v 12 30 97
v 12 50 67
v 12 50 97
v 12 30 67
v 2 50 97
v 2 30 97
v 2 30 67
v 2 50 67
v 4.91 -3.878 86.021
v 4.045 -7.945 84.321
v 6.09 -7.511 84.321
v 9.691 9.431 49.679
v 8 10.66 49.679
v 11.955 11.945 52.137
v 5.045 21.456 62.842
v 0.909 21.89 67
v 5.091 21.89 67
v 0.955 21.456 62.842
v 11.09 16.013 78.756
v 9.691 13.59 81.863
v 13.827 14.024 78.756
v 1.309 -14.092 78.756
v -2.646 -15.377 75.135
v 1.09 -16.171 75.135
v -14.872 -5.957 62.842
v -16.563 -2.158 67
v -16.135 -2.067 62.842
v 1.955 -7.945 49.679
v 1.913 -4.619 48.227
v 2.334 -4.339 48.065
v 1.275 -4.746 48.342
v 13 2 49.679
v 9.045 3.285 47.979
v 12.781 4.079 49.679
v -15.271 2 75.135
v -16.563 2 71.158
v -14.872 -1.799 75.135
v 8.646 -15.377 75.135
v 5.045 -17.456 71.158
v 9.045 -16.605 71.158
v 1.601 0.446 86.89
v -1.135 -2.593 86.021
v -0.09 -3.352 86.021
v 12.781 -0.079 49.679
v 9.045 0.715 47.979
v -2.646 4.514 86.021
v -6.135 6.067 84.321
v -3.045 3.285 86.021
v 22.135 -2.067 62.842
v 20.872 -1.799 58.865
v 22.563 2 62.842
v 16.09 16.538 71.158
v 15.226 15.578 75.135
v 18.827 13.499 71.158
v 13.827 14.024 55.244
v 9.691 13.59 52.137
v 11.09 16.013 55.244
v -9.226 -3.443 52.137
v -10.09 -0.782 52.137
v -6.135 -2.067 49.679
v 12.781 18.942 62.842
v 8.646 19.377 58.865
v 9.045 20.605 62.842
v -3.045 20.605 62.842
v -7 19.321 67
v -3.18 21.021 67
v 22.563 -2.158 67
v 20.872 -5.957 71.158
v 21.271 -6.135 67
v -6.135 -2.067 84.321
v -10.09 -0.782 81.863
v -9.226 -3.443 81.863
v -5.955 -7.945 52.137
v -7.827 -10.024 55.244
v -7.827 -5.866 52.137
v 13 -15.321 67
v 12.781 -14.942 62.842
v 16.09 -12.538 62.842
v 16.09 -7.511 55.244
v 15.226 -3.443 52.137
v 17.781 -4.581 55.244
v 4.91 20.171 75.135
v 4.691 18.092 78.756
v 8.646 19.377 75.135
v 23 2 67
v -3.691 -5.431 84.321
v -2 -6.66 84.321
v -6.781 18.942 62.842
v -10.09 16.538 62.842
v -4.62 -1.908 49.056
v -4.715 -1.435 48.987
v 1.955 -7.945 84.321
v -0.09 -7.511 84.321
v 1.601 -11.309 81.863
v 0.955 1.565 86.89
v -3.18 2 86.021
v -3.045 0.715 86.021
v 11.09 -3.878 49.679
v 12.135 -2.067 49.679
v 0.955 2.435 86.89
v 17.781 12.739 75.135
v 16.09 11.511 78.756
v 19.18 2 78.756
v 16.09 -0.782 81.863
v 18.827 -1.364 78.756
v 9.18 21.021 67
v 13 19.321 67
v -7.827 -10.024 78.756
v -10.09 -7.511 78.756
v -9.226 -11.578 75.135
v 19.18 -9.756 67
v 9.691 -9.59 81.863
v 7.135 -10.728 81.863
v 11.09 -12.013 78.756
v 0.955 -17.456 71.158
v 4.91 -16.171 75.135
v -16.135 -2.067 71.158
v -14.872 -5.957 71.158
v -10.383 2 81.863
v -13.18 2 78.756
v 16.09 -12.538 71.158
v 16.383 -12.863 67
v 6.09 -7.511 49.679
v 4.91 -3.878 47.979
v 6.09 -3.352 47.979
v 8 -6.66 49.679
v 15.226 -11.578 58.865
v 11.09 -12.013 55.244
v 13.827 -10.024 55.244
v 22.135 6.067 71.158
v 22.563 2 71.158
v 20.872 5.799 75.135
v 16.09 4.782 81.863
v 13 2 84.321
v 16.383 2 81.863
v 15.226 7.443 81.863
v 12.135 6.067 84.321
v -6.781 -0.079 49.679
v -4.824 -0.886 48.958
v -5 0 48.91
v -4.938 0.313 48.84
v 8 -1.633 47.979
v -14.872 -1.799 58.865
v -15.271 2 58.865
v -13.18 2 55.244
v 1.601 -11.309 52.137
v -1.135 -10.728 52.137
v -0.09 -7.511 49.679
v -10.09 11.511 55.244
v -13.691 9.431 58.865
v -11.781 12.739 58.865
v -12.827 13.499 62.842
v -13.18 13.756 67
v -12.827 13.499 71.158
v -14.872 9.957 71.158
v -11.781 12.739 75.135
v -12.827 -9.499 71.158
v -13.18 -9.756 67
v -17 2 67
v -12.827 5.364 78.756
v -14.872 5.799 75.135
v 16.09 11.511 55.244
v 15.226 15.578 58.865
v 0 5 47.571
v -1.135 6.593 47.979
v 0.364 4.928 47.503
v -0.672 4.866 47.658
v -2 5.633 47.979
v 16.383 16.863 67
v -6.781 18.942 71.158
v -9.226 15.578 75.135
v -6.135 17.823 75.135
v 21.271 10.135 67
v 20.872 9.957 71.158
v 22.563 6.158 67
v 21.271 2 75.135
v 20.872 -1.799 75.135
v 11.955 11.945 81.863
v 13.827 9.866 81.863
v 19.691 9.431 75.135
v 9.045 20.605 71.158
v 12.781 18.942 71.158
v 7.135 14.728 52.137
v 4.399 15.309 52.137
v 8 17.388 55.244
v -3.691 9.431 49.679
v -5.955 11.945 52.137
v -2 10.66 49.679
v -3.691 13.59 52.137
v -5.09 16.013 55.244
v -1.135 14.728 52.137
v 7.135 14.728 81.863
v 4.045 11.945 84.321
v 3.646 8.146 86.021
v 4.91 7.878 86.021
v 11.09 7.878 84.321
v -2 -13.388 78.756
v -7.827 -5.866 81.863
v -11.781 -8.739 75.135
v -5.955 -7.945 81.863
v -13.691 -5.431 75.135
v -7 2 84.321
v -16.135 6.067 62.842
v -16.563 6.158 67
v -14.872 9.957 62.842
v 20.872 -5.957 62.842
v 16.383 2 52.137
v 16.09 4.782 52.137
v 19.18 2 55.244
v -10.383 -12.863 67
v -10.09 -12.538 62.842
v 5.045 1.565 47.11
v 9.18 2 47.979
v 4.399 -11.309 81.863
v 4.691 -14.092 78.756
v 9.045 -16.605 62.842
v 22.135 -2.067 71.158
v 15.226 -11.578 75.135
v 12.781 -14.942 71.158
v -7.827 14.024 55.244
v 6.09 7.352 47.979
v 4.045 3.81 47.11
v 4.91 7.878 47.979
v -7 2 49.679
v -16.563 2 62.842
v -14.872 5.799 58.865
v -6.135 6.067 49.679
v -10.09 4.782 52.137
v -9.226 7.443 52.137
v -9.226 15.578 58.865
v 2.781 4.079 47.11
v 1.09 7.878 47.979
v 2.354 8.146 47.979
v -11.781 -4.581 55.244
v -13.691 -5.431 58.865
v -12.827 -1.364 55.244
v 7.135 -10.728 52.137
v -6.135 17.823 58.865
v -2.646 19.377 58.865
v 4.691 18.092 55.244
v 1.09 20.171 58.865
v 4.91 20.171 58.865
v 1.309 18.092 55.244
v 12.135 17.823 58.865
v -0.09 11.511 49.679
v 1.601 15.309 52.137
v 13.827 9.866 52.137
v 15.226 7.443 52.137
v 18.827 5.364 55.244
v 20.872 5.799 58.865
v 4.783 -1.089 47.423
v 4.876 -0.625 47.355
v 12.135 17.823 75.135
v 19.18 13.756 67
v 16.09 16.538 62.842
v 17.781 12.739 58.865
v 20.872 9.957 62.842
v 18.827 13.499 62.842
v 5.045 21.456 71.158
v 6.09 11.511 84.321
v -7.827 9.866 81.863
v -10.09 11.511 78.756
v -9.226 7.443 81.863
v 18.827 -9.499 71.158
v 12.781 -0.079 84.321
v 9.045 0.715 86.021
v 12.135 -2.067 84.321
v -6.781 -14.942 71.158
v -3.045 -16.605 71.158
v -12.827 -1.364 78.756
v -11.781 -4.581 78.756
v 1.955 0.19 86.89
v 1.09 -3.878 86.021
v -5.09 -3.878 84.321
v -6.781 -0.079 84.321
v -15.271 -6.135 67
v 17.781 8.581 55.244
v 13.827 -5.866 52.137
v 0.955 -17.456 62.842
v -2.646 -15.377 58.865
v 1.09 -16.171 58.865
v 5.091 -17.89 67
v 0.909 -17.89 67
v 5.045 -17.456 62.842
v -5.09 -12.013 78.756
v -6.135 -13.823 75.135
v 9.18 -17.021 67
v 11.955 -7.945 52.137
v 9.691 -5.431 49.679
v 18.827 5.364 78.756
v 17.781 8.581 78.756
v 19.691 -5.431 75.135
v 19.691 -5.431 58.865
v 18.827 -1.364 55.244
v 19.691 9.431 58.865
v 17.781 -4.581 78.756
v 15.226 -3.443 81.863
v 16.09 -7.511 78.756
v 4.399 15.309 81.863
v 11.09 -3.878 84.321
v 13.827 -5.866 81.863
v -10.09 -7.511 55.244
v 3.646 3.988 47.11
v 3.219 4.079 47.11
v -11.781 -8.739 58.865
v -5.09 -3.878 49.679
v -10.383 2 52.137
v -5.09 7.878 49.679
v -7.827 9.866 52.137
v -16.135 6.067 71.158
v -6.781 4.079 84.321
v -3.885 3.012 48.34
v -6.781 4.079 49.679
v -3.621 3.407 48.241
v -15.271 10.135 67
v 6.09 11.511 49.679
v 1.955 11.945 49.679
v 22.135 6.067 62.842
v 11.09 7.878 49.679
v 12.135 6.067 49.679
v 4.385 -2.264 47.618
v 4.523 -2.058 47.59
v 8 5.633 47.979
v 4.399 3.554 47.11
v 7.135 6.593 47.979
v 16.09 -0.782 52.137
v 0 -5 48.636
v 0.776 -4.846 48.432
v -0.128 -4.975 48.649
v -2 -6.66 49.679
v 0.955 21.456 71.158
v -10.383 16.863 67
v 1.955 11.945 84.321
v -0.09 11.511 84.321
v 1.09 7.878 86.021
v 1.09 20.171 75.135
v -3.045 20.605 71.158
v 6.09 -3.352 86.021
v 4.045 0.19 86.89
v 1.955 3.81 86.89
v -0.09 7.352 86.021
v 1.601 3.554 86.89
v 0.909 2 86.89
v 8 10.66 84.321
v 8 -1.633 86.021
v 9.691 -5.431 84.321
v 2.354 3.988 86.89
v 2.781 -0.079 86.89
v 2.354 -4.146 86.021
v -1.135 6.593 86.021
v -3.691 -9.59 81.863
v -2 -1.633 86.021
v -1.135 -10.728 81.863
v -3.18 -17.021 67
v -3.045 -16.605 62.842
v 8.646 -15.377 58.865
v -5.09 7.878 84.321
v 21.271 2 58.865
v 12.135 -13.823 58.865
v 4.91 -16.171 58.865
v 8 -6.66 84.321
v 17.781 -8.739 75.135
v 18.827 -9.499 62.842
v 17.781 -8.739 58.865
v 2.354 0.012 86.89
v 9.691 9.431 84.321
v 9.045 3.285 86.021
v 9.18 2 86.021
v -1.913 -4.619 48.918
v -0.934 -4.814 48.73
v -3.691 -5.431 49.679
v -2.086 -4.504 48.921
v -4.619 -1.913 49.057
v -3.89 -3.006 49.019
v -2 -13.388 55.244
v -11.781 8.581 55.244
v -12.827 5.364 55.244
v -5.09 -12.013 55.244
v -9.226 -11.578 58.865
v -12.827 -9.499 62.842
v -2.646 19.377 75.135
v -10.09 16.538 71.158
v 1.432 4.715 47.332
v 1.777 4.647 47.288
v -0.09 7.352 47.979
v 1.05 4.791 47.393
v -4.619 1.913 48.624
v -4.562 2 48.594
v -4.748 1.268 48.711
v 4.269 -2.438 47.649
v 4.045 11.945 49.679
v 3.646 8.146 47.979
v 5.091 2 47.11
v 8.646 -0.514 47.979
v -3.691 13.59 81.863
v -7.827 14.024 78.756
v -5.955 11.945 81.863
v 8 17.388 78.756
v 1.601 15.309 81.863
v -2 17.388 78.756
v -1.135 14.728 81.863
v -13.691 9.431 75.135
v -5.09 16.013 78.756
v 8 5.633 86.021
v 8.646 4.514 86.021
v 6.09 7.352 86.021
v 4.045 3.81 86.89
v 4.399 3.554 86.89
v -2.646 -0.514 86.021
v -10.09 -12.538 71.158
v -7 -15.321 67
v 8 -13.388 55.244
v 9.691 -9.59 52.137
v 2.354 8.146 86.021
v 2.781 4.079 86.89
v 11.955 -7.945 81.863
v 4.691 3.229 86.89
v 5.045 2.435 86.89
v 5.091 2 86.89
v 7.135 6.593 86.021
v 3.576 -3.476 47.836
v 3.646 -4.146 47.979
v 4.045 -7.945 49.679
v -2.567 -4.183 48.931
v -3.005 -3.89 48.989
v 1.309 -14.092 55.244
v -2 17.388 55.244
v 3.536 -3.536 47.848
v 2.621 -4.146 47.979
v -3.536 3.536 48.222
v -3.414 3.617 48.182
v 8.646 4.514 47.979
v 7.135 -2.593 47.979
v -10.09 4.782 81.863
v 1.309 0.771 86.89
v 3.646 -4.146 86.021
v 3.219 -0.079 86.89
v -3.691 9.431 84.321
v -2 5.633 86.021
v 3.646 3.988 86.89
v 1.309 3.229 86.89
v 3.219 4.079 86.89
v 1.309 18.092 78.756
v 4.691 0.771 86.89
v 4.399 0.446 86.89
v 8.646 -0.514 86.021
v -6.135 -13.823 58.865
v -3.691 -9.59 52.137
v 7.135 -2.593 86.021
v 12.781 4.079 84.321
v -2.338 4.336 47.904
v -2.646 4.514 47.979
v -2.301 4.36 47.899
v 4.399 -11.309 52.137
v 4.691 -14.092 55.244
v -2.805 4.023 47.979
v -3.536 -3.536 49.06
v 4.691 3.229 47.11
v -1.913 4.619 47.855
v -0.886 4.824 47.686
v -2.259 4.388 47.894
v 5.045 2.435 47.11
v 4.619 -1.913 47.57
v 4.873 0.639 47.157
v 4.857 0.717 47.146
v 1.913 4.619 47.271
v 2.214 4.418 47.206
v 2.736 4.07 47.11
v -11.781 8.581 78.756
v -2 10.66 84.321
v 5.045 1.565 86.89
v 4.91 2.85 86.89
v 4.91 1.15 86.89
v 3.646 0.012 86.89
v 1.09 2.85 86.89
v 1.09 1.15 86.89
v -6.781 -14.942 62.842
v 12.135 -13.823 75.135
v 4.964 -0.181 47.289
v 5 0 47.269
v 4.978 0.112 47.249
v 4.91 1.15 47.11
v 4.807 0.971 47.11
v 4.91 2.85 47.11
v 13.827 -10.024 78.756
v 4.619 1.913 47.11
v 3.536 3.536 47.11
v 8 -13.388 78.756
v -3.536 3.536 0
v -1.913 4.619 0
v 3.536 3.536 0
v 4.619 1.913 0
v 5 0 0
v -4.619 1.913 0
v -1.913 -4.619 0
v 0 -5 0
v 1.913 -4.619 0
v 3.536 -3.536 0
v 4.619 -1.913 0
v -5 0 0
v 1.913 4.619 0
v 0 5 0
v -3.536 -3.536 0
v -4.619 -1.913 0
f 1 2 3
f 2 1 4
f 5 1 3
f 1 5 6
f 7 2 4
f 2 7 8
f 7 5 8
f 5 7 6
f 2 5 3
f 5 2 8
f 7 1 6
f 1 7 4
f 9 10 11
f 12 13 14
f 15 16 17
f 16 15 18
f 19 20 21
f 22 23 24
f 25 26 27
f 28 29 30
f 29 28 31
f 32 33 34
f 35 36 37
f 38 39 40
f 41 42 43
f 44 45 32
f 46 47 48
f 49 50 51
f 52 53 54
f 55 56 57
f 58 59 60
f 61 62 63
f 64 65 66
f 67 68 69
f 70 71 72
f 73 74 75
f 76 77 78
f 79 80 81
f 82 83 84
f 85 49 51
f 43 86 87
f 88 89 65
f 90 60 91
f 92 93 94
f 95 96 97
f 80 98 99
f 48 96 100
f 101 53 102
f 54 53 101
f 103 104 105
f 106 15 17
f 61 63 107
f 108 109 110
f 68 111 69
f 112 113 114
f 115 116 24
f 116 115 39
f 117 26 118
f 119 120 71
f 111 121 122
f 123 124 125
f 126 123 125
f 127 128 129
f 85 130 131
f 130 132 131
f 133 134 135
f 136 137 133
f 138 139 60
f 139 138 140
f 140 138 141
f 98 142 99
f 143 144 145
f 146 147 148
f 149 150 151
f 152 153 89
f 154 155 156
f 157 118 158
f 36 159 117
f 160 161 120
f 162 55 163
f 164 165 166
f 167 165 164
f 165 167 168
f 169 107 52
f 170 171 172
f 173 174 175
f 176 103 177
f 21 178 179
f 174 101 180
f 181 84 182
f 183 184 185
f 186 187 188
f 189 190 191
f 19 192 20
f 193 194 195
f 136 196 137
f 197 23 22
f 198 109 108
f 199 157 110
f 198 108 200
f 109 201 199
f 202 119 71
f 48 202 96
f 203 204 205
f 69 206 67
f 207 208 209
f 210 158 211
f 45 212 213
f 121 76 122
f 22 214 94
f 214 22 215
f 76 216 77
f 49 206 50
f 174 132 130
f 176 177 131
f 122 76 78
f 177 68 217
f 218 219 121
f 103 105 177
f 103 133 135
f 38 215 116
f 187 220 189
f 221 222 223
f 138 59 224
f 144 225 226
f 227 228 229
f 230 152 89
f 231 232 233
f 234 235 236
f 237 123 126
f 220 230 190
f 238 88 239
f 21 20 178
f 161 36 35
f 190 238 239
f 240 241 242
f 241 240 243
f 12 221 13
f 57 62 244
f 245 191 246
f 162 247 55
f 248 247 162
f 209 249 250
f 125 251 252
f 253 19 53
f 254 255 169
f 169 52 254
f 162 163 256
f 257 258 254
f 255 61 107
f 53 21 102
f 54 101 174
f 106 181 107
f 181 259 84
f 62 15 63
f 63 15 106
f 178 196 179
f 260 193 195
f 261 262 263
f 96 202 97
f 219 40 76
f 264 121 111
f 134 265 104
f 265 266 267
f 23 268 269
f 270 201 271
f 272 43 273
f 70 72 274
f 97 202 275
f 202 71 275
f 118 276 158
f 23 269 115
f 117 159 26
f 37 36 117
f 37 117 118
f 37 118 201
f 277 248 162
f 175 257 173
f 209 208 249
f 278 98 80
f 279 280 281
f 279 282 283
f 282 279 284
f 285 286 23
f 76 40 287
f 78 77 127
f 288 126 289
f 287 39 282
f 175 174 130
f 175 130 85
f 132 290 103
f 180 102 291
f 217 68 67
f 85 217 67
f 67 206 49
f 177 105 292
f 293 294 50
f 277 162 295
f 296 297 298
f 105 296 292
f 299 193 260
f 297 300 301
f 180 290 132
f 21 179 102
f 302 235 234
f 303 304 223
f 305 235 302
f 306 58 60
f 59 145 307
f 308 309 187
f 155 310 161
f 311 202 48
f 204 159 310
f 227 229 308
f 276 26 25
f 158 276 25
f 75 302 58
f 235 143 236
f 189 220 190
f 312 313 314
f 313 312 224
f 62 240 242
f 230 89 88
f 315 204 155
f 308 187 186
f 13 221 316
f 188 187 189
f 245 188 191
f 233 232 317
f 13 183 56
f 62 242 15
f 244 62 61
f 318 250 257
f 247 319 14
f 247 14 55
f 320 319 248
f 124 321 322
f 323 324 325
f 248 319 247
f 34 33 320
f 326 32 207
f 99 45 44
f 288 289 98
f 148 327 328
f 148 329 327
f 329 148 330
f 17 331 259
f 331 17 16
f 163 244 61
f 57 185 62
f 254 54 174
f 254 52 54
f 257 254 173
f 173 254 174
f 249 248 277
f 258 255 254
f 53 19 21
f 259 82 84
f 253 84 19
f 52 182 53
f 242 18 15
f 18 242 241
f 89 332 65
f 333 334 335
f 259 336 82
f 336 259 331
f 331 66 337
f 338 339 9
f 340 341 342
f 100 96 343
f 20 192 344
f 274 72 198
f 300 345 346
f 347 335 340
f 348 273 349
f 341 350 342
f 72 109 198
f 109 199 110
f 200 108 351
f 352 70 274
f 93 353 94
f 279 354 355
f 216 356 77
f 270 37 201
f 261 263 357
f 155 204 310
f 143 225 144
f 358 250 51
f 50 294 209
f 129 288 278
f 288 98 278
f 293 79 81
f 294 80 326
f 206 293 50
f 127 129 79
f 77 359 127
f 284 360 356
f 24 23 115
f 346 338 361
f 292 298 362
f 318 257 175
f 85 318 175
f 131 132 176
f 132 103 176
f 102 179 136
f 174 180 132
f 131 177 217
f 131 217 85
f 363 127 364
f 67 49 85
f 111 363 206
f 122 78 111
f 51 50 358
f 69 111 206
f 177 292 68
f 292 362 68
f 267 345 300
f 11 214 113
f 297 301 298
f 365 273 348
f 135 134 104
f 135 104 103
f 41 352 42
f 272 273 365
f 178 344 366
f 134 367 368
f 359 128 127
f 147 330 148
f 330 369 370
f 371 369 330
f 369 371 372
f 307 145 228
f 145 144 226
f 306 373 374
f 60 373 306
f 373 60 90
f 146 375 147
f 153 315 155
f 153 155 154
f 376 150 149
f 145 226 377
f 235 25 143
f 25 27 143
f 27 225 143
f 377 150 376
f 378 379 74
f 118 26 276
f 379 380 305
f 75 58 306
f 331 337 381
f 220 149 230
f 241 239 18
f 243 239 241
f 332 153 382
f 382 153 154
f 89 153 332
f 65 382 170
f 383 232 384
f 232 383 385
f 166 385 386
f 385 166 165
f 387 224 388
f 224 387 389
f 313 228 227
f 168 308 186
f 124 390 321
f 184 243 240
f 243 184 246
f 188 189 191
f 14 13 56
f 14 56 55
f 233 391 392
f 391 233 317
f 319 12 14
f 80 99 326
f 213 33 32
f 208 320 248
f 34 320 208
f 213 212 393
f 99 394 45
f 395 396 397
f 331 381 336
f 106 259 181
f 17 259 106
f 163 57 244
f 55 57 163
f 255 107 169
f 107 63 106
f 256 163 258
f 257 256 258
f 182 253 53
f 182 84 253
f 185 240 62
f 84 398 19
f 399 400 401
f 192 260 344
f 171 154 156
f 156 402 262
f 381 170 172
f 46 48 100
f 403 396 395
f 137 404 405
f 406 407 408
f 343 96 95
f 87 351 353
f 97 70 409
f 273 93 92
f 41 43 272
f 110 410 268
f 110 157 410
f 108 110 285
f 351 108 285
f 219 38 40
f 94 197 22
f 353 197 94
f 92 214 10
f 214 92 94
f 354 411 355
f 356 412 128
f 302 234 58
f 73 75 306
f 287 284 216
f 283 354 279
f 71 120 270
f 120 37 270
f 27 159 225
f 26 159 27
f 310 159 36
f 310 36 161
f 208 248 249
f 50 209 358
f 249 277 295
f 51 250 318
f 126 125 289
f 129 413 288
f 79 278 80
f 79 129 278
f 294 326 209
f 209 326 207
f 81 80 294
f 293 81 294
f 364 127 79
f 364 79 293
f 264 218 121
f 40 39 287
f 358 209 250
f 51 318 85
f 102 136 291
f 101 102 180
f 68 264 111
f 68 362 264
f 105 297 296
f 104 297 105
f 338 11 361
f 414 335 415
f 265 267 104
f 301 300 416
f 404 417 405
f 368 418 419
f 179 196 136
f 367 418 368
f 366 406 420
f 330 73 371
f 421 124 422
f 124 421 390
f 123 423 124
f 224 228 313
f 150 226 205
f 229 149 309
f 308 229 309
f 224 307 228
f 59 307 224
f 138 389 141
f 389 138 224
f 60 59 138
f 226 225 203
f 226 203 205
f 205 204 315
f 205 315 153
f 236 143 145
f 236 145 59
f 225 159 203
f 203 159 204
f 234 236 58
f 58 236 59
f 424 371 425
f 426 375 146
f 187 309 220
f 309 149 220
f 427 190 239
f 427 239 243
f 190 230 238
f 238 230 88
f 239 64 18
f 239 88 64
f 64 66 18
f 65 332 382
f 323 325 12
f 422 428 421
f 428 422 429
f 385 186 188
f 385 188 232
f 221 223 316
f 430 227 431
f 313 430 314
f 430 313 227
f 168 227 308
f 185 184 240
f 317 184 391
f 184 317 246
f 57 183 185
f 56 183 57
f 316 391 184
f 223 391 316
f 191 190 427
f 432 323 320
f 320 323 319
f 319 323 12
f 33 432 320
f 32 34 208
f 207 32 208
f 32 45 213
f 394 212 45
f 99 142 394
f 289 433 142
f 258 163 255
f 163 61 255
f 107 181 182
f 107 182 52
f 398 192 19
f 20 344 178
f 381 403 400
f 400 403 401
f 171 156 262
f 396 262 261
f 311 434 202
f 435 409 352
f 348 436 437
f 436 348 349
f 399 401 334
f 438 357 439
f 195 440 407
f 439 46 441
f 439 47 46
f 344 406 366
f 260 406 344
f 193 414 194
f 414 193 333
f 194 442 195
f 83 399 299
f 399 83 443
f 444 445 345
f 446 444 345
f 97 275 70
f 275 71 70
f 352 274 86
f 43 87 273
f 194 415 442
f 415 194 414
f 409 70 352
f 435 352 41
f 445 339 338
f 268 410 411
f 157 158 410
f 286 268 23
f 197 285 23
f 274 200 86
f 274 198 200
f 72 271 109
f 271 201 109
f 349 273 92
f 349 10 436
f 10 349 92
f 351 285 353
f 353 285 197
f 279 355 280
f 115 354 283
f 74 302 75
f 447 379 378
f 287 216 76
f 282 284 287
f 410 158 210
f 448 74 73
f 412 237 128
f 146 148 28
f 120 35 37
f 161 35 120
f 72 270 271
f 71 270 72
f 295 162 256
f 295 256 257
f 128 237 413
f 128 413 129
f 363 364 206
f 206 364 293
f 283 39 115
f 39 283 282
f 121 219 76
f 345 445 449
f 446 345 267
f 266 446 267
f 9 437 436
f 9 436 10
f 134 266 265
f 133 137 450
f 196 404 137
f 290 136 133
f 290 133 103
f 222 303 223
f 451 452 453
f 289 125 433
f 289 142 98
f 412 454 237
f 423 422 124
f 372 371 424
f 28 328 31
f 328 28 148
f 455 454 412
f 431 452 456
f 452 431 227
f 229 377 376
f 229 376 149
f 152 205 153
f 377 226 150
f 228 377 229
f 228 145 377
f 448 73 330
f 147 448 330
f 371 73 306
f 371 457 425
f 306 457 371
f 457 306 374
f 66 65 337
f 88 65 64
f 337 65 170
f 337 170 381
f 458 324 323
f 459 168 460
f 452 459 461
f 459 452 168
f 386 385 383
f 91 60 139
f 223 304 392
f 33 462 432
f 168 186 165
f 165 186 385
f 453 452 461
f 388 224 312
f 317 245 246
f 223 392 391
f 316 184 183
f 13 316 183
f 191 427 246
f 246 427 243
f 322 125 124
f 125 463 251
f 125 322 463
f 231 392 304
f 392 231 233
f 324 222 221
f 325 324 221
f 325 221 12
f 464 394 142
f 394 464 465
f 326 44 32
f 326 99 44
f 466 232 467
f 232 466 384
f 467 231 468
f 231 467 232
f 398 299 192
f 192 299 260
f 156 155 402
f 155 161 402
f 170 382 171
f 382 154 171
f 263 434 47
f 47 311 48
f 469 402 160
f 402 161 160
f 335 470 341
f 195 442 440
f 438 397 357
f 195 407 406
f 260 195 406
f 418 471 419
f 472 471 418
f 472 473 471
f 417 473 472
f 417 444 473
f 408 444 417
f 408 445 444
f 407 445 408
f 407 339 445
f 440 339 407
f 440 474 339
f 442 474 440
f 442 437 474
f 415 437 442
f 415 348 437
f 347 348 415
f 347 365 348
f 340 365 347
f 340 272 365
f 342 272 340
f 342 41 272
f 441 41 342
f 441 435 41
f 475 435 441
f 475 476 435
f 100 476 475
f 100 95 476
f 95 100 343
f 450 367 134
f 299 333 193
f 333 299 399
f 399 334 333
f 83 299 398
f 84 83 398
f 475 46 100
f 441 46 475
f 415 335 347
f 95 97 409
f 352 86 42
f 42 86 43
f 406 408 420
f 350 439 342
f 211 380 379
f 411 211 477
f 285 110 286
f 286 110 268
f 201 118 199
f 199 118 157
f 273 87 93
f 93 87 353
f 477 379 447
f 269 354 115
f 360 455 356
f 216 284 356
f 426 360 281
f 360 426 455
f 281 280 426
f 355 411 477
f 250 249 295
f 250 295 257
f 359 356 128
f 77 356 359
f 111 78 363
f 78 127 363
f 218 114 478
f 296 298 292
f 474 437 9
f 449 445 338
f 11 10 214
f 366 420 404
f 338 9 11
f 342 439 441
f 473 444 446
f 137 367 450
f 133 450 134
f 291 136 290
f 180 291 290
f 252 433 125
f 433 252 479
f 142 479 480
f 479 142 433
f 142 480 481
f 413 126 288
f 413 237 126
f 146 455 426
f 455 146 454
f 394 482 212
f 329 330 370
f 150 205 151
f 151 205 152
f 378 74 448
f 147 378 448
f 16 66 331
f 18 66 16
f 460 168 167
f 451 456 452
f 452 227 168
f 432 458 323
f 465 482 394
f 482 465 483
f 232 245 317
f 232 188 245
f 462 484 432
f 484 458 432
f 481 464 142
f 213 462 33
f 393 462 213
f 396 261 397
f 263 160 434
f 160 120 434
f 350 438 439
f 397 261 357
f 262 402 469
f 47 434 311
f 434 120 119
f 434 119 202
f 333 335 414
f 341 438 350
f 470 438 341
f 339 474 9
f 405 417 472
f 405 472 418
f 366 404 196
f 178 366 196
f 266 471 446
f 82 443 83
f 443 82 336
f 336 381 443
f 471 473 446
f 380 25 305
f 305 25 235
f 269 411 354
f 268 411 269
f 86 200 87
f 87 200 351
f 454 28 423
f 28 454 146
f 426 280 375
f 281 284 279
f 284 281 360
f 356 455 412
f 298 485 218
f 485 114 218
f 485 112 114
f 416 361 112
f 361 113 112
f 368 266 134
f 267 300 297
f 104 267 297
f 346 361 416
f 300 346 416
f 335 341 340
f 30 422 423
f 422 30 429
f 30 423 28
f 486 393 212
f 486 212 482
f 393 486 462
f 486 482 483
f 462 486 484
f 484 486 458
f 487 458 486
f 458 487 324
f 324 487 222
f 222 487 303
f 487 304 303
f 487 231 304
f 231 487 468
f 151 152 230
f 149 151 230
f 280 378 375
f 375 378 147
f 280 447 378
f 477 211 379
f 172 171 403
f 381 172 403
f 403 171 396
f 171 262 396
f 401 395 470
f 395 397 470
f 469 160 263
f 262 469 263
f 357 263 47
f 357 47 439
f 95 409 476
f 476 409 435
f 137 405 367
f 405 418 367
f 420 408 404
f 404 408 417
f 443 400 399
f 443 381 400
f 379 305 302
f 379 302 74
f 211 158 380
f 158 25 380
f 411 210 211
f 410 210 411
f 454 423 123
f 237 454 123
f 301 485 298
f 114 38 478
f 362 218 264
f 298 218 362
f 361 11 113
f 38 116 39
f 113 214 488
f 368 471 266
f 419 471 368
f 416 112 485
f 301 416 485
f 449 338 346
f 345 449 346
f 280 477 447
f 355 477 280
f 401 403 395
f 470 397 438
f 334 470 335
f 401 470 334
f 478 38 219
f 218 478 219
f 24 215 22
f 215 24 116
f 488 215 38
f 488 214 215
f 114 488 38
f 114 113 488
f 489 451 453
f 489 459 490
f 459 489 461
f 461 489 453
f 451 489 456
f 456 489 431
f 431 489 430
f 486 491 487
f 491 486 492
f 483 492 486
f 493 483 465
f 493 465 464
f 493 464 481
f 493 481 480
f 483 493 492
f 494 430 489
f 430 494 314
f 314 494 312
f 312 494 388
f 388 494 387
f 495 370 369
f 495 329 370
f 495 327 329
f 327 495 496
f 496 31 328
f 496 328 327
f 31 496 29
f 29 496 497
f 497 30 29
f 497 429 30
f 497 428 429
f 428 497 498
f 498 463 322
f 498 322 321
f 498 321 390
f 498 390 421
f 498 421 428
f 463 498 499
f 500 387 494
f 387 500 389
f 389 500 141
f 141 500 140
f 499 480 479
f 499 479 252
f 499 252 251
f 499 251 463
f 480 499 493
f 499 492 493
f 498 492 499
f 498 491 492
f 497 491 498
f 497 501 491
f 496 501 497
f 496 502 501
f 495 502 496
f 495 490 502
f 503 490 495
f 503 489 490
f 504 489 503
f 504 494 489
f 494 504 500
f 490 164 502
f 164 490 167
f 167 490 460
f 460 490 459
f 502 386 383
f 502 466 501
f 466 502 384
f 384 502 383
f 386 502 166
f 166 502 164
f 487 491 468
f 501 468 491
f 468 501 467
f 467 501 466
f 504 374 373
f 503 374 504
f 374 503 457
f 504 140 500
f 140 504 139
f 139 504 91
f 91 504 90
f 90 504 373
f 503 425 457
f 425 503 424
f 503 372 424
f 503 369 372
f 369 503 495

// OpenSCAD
color ("pink")
translate ([ 2, 30,67 ])
cube([10,20,30]);

color("blue")
translate ([ 3, 2,67 ])
sphere(20);

color("brown") 
cylinder(h= 50,d= 10);
